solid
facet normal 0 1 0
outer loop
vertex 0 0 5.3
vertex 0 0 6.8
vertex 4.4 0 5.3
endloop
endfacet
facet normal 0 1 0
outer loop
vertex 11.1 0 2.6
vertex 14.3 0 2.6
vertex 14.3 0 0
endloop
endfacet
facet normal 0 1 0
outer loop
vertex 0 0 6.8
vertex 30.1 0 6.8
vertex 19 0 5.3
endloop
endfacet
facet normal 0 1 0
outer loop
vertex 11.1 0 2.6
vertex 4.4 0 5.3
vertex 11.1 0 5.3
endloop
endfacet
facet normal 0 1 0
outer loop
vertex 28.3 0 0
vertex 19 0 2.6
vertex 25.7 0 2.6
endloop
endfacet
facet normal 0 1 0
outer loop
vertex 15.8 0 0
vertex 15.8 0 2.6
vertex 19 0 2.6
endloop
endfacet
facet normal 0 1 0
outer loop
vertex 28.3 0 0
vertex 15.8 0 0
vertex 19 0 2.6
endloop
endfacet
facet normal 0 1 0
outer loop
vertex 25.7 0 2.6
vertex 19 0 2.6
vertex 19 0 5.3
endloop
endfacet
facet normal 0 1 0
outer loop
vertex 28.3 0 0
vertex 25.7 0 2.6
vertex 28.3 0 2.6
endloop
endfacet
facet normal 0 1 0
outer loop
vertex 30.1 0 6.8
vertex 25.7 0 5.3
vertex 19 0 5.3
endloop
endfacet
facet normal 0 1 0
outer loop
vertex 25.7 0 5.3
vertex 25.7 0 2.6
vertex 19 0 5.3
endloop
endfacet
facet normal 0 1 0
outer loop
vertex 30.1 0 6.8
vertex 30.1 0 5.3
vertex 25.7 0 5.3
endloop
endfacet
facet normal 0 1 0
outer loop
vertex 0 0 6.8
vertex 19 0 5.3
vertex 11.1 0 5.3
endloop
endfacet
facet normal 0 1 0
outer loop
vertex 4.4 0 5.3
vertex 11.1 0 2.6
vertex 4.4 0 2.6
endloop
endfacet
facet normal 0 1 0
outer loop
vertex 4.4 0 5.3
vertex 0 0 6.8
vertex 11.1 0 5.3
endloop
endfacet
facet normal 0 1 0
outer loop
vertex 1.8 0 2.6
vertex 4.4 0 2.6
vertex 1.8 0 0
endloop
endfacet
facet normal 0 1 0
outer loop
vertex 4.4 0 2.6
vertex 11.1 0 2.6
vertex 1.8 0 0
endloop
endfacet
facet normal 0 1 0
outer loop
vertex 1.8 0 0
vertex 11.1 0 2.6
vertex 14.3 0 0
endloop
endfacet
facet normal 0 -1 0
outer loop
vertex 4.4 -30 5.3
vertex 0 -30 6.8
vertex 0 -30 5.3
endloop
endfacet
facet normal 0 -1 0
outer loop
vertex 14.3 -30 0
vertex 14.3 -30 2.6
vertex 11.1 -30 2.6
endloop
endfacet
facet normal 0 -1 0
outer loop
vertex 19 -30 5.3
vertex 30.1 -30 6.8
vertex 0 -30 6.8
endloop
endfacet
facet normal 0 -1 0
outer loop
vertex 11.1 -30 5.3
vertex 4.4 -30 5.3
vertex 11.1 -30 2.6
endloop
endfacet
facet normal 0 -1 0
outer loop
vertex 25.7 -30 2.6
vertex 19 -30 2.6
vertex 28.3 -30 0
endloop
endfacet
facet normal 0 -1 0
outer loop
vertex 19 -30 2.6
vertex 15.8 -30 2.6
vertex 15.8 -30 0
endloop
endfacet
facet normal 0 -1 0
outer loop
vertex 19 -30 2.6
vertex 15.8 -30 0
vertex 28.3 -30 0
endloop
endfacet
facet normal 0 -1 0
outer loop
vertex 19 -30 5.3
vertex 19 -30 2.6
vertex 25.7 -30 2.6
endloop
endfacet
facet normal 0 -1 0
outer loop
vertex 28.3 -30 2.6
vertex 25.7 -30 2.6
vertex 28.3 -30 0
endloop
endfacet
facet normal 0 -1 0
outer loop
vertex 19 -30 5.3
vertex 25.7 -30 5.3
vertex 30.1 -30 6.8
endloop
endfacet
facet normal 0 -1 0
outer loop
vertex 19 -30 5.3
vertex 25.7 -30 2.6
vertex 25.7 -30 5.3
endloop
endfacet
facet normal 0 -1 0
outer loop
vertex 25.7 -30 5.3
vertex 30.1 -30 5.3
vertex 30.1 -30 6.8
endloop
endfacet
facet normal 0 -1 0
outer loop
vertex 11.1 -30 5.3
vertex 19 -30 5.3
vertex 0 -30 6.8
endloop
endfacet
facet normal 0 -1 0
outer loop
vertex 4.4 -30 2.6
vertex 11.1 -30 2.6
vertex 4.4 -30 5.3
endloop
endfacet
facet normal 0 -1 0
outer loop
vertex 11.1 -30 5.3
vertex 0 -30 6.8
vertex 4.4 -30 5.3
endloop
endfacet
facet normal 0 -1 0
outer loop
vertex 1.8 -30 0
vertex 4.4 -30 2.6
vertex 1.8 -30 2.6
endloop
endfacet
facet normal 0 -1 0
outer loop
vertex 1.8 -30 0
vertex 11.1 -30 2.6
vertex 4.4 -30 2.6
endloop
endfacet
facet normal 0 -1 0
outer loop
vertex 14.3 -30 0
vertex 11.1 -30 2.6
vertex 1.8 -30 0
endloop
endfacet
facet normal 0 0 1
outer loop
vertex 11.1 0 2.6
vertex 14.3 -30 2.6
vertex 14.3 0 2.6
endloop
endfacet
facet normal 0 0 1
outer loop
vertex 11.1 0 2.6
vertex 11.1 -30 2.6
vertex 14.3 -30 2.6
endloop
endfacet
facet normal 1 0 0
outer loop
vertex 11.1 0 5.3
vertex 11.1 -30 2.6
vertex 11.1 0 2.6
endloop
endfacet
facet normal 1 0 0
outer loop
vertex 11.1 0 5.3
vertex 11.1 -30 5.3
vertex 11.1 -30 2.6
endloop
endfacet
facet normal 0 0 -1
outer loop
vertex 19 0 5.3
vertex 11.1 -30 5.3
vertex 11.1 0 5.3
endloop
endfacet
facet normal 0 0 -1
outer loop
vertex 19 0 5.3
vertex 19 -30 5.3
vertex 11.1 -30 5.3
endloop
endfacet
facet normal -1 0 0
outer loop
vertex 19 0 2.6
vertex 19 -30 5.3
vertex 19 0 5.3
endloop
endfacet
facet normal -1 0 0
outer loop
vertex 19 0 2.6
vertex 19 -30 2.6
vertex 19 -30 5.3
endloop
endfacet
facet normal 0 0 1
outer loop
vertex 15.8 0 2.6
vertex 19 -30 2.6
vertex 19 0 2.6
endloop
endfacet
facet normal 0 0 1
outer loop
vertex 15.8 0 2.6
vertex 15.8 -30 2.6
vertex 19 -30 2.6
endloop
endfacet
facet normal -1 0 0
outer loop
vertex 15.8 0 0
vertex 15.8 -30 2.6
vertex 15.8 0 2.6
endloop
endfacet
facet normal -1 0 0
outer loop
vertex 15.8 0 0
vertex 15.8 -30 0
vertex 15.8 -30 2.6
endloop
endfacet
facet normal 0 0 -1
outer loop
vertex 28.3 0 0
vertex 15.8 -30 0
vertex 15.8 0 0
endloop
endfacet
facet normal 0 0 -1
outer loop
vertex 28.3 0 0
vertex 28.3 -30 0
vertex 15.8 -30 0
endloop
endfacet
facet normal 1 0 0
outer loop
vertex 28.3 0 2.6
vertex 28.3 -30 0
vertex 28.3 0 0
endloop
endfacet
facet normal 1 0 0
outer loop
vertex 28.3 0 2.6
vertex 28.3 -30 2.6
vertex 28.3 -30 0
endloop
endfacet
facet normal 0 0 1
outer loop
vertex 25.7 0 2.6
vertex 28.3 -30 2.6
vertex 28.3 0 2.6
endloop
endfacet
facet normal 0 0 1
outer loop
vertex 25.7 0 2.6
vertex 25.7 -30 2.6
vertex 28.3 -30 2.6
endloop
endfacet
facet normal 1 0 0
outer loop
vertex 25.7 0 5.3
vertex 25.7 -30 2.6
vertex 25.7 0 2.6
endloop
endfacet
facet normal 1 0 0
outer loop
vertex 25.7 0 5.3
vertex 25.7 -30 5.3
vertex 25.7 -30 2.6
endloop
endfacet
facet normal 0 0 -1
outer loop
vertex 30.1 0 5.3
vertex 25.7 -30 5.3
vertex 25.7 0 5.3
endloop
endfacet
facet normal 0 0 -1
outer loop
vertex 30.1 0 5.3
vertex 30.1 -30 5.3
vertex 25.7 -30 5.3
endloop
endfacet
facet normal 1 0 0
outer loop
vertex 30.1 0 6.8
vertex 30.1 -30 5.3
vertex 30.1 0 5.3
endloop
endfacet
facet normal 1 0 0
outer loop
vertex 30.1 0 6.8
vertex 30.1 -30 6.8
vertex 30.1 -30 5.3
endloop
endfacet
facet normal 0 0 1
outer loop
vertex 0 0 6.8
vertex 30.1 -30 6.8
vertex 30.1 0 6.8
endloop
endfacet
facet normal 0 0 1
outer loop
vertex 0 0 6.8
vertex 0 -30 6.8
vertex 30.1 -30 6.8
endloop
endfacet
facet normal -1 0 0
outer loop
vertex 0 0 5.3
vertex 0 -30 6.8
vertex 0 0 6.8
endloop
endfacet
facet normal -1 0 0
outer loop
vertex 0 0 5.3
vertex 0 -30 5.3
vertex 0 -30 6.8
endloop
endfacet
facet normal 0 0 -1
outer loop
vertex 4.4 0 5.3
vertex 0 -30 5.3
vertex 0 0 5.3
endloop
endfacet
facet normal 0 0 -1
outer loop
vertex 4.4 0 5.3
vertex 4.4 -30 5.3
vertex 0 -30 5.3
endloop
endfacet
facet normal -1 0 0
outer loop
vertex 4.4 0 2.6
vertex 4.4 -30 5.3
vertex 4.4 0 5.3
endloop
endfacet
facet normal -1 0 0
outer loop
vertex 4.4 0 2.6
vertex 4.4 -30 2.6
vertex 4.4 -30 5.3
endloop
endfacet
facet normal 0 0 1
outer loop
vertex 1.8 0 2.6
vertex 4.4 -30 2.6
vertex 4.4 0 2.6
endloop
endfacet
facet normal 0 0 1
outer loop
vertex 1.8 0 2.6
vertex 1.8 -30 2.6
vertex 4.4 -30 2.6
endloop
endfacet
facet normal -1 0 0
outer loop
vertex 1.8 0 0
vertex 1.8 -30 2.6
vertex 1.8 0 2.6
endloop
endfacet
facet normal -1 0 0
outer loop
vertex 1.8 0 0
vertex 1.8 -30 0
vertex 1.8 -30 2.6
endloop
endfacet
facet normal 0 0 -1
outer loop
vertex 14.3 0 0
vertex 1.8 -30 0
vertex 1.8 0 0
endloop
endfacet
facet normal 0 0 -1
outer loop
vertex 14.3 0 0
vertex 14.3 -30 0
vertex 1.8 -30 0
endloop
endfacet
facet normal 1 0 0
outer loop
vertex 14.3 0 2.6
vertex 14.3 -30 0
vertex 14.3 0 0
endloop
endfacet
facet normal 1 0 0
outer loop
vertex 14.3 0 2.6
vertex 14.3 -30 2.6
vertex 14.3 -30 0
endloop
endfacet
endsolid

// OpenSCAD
union(){rotate([90,0,0])linear_extrude(height=30)
union(){
    foot();
    translate([30.1,0,0])mirror()foot();
    top();
};
/*translate([15,-7,6.45])
rotate([0,0,0])
scale([0.6,0.6,0.6])import("C:/Users/AJL/Downloads/low_poly_yellow_cat.stl");*/
}
module foot(){
translate([1.8,0,0])union(){
    square([12.5, 2.6]);
    translate([2.6,0,0])square([6.7, 5.4]);
    }
}


module top(){
    translate([0,5.3])square([30.1,1.5]);
}
    
